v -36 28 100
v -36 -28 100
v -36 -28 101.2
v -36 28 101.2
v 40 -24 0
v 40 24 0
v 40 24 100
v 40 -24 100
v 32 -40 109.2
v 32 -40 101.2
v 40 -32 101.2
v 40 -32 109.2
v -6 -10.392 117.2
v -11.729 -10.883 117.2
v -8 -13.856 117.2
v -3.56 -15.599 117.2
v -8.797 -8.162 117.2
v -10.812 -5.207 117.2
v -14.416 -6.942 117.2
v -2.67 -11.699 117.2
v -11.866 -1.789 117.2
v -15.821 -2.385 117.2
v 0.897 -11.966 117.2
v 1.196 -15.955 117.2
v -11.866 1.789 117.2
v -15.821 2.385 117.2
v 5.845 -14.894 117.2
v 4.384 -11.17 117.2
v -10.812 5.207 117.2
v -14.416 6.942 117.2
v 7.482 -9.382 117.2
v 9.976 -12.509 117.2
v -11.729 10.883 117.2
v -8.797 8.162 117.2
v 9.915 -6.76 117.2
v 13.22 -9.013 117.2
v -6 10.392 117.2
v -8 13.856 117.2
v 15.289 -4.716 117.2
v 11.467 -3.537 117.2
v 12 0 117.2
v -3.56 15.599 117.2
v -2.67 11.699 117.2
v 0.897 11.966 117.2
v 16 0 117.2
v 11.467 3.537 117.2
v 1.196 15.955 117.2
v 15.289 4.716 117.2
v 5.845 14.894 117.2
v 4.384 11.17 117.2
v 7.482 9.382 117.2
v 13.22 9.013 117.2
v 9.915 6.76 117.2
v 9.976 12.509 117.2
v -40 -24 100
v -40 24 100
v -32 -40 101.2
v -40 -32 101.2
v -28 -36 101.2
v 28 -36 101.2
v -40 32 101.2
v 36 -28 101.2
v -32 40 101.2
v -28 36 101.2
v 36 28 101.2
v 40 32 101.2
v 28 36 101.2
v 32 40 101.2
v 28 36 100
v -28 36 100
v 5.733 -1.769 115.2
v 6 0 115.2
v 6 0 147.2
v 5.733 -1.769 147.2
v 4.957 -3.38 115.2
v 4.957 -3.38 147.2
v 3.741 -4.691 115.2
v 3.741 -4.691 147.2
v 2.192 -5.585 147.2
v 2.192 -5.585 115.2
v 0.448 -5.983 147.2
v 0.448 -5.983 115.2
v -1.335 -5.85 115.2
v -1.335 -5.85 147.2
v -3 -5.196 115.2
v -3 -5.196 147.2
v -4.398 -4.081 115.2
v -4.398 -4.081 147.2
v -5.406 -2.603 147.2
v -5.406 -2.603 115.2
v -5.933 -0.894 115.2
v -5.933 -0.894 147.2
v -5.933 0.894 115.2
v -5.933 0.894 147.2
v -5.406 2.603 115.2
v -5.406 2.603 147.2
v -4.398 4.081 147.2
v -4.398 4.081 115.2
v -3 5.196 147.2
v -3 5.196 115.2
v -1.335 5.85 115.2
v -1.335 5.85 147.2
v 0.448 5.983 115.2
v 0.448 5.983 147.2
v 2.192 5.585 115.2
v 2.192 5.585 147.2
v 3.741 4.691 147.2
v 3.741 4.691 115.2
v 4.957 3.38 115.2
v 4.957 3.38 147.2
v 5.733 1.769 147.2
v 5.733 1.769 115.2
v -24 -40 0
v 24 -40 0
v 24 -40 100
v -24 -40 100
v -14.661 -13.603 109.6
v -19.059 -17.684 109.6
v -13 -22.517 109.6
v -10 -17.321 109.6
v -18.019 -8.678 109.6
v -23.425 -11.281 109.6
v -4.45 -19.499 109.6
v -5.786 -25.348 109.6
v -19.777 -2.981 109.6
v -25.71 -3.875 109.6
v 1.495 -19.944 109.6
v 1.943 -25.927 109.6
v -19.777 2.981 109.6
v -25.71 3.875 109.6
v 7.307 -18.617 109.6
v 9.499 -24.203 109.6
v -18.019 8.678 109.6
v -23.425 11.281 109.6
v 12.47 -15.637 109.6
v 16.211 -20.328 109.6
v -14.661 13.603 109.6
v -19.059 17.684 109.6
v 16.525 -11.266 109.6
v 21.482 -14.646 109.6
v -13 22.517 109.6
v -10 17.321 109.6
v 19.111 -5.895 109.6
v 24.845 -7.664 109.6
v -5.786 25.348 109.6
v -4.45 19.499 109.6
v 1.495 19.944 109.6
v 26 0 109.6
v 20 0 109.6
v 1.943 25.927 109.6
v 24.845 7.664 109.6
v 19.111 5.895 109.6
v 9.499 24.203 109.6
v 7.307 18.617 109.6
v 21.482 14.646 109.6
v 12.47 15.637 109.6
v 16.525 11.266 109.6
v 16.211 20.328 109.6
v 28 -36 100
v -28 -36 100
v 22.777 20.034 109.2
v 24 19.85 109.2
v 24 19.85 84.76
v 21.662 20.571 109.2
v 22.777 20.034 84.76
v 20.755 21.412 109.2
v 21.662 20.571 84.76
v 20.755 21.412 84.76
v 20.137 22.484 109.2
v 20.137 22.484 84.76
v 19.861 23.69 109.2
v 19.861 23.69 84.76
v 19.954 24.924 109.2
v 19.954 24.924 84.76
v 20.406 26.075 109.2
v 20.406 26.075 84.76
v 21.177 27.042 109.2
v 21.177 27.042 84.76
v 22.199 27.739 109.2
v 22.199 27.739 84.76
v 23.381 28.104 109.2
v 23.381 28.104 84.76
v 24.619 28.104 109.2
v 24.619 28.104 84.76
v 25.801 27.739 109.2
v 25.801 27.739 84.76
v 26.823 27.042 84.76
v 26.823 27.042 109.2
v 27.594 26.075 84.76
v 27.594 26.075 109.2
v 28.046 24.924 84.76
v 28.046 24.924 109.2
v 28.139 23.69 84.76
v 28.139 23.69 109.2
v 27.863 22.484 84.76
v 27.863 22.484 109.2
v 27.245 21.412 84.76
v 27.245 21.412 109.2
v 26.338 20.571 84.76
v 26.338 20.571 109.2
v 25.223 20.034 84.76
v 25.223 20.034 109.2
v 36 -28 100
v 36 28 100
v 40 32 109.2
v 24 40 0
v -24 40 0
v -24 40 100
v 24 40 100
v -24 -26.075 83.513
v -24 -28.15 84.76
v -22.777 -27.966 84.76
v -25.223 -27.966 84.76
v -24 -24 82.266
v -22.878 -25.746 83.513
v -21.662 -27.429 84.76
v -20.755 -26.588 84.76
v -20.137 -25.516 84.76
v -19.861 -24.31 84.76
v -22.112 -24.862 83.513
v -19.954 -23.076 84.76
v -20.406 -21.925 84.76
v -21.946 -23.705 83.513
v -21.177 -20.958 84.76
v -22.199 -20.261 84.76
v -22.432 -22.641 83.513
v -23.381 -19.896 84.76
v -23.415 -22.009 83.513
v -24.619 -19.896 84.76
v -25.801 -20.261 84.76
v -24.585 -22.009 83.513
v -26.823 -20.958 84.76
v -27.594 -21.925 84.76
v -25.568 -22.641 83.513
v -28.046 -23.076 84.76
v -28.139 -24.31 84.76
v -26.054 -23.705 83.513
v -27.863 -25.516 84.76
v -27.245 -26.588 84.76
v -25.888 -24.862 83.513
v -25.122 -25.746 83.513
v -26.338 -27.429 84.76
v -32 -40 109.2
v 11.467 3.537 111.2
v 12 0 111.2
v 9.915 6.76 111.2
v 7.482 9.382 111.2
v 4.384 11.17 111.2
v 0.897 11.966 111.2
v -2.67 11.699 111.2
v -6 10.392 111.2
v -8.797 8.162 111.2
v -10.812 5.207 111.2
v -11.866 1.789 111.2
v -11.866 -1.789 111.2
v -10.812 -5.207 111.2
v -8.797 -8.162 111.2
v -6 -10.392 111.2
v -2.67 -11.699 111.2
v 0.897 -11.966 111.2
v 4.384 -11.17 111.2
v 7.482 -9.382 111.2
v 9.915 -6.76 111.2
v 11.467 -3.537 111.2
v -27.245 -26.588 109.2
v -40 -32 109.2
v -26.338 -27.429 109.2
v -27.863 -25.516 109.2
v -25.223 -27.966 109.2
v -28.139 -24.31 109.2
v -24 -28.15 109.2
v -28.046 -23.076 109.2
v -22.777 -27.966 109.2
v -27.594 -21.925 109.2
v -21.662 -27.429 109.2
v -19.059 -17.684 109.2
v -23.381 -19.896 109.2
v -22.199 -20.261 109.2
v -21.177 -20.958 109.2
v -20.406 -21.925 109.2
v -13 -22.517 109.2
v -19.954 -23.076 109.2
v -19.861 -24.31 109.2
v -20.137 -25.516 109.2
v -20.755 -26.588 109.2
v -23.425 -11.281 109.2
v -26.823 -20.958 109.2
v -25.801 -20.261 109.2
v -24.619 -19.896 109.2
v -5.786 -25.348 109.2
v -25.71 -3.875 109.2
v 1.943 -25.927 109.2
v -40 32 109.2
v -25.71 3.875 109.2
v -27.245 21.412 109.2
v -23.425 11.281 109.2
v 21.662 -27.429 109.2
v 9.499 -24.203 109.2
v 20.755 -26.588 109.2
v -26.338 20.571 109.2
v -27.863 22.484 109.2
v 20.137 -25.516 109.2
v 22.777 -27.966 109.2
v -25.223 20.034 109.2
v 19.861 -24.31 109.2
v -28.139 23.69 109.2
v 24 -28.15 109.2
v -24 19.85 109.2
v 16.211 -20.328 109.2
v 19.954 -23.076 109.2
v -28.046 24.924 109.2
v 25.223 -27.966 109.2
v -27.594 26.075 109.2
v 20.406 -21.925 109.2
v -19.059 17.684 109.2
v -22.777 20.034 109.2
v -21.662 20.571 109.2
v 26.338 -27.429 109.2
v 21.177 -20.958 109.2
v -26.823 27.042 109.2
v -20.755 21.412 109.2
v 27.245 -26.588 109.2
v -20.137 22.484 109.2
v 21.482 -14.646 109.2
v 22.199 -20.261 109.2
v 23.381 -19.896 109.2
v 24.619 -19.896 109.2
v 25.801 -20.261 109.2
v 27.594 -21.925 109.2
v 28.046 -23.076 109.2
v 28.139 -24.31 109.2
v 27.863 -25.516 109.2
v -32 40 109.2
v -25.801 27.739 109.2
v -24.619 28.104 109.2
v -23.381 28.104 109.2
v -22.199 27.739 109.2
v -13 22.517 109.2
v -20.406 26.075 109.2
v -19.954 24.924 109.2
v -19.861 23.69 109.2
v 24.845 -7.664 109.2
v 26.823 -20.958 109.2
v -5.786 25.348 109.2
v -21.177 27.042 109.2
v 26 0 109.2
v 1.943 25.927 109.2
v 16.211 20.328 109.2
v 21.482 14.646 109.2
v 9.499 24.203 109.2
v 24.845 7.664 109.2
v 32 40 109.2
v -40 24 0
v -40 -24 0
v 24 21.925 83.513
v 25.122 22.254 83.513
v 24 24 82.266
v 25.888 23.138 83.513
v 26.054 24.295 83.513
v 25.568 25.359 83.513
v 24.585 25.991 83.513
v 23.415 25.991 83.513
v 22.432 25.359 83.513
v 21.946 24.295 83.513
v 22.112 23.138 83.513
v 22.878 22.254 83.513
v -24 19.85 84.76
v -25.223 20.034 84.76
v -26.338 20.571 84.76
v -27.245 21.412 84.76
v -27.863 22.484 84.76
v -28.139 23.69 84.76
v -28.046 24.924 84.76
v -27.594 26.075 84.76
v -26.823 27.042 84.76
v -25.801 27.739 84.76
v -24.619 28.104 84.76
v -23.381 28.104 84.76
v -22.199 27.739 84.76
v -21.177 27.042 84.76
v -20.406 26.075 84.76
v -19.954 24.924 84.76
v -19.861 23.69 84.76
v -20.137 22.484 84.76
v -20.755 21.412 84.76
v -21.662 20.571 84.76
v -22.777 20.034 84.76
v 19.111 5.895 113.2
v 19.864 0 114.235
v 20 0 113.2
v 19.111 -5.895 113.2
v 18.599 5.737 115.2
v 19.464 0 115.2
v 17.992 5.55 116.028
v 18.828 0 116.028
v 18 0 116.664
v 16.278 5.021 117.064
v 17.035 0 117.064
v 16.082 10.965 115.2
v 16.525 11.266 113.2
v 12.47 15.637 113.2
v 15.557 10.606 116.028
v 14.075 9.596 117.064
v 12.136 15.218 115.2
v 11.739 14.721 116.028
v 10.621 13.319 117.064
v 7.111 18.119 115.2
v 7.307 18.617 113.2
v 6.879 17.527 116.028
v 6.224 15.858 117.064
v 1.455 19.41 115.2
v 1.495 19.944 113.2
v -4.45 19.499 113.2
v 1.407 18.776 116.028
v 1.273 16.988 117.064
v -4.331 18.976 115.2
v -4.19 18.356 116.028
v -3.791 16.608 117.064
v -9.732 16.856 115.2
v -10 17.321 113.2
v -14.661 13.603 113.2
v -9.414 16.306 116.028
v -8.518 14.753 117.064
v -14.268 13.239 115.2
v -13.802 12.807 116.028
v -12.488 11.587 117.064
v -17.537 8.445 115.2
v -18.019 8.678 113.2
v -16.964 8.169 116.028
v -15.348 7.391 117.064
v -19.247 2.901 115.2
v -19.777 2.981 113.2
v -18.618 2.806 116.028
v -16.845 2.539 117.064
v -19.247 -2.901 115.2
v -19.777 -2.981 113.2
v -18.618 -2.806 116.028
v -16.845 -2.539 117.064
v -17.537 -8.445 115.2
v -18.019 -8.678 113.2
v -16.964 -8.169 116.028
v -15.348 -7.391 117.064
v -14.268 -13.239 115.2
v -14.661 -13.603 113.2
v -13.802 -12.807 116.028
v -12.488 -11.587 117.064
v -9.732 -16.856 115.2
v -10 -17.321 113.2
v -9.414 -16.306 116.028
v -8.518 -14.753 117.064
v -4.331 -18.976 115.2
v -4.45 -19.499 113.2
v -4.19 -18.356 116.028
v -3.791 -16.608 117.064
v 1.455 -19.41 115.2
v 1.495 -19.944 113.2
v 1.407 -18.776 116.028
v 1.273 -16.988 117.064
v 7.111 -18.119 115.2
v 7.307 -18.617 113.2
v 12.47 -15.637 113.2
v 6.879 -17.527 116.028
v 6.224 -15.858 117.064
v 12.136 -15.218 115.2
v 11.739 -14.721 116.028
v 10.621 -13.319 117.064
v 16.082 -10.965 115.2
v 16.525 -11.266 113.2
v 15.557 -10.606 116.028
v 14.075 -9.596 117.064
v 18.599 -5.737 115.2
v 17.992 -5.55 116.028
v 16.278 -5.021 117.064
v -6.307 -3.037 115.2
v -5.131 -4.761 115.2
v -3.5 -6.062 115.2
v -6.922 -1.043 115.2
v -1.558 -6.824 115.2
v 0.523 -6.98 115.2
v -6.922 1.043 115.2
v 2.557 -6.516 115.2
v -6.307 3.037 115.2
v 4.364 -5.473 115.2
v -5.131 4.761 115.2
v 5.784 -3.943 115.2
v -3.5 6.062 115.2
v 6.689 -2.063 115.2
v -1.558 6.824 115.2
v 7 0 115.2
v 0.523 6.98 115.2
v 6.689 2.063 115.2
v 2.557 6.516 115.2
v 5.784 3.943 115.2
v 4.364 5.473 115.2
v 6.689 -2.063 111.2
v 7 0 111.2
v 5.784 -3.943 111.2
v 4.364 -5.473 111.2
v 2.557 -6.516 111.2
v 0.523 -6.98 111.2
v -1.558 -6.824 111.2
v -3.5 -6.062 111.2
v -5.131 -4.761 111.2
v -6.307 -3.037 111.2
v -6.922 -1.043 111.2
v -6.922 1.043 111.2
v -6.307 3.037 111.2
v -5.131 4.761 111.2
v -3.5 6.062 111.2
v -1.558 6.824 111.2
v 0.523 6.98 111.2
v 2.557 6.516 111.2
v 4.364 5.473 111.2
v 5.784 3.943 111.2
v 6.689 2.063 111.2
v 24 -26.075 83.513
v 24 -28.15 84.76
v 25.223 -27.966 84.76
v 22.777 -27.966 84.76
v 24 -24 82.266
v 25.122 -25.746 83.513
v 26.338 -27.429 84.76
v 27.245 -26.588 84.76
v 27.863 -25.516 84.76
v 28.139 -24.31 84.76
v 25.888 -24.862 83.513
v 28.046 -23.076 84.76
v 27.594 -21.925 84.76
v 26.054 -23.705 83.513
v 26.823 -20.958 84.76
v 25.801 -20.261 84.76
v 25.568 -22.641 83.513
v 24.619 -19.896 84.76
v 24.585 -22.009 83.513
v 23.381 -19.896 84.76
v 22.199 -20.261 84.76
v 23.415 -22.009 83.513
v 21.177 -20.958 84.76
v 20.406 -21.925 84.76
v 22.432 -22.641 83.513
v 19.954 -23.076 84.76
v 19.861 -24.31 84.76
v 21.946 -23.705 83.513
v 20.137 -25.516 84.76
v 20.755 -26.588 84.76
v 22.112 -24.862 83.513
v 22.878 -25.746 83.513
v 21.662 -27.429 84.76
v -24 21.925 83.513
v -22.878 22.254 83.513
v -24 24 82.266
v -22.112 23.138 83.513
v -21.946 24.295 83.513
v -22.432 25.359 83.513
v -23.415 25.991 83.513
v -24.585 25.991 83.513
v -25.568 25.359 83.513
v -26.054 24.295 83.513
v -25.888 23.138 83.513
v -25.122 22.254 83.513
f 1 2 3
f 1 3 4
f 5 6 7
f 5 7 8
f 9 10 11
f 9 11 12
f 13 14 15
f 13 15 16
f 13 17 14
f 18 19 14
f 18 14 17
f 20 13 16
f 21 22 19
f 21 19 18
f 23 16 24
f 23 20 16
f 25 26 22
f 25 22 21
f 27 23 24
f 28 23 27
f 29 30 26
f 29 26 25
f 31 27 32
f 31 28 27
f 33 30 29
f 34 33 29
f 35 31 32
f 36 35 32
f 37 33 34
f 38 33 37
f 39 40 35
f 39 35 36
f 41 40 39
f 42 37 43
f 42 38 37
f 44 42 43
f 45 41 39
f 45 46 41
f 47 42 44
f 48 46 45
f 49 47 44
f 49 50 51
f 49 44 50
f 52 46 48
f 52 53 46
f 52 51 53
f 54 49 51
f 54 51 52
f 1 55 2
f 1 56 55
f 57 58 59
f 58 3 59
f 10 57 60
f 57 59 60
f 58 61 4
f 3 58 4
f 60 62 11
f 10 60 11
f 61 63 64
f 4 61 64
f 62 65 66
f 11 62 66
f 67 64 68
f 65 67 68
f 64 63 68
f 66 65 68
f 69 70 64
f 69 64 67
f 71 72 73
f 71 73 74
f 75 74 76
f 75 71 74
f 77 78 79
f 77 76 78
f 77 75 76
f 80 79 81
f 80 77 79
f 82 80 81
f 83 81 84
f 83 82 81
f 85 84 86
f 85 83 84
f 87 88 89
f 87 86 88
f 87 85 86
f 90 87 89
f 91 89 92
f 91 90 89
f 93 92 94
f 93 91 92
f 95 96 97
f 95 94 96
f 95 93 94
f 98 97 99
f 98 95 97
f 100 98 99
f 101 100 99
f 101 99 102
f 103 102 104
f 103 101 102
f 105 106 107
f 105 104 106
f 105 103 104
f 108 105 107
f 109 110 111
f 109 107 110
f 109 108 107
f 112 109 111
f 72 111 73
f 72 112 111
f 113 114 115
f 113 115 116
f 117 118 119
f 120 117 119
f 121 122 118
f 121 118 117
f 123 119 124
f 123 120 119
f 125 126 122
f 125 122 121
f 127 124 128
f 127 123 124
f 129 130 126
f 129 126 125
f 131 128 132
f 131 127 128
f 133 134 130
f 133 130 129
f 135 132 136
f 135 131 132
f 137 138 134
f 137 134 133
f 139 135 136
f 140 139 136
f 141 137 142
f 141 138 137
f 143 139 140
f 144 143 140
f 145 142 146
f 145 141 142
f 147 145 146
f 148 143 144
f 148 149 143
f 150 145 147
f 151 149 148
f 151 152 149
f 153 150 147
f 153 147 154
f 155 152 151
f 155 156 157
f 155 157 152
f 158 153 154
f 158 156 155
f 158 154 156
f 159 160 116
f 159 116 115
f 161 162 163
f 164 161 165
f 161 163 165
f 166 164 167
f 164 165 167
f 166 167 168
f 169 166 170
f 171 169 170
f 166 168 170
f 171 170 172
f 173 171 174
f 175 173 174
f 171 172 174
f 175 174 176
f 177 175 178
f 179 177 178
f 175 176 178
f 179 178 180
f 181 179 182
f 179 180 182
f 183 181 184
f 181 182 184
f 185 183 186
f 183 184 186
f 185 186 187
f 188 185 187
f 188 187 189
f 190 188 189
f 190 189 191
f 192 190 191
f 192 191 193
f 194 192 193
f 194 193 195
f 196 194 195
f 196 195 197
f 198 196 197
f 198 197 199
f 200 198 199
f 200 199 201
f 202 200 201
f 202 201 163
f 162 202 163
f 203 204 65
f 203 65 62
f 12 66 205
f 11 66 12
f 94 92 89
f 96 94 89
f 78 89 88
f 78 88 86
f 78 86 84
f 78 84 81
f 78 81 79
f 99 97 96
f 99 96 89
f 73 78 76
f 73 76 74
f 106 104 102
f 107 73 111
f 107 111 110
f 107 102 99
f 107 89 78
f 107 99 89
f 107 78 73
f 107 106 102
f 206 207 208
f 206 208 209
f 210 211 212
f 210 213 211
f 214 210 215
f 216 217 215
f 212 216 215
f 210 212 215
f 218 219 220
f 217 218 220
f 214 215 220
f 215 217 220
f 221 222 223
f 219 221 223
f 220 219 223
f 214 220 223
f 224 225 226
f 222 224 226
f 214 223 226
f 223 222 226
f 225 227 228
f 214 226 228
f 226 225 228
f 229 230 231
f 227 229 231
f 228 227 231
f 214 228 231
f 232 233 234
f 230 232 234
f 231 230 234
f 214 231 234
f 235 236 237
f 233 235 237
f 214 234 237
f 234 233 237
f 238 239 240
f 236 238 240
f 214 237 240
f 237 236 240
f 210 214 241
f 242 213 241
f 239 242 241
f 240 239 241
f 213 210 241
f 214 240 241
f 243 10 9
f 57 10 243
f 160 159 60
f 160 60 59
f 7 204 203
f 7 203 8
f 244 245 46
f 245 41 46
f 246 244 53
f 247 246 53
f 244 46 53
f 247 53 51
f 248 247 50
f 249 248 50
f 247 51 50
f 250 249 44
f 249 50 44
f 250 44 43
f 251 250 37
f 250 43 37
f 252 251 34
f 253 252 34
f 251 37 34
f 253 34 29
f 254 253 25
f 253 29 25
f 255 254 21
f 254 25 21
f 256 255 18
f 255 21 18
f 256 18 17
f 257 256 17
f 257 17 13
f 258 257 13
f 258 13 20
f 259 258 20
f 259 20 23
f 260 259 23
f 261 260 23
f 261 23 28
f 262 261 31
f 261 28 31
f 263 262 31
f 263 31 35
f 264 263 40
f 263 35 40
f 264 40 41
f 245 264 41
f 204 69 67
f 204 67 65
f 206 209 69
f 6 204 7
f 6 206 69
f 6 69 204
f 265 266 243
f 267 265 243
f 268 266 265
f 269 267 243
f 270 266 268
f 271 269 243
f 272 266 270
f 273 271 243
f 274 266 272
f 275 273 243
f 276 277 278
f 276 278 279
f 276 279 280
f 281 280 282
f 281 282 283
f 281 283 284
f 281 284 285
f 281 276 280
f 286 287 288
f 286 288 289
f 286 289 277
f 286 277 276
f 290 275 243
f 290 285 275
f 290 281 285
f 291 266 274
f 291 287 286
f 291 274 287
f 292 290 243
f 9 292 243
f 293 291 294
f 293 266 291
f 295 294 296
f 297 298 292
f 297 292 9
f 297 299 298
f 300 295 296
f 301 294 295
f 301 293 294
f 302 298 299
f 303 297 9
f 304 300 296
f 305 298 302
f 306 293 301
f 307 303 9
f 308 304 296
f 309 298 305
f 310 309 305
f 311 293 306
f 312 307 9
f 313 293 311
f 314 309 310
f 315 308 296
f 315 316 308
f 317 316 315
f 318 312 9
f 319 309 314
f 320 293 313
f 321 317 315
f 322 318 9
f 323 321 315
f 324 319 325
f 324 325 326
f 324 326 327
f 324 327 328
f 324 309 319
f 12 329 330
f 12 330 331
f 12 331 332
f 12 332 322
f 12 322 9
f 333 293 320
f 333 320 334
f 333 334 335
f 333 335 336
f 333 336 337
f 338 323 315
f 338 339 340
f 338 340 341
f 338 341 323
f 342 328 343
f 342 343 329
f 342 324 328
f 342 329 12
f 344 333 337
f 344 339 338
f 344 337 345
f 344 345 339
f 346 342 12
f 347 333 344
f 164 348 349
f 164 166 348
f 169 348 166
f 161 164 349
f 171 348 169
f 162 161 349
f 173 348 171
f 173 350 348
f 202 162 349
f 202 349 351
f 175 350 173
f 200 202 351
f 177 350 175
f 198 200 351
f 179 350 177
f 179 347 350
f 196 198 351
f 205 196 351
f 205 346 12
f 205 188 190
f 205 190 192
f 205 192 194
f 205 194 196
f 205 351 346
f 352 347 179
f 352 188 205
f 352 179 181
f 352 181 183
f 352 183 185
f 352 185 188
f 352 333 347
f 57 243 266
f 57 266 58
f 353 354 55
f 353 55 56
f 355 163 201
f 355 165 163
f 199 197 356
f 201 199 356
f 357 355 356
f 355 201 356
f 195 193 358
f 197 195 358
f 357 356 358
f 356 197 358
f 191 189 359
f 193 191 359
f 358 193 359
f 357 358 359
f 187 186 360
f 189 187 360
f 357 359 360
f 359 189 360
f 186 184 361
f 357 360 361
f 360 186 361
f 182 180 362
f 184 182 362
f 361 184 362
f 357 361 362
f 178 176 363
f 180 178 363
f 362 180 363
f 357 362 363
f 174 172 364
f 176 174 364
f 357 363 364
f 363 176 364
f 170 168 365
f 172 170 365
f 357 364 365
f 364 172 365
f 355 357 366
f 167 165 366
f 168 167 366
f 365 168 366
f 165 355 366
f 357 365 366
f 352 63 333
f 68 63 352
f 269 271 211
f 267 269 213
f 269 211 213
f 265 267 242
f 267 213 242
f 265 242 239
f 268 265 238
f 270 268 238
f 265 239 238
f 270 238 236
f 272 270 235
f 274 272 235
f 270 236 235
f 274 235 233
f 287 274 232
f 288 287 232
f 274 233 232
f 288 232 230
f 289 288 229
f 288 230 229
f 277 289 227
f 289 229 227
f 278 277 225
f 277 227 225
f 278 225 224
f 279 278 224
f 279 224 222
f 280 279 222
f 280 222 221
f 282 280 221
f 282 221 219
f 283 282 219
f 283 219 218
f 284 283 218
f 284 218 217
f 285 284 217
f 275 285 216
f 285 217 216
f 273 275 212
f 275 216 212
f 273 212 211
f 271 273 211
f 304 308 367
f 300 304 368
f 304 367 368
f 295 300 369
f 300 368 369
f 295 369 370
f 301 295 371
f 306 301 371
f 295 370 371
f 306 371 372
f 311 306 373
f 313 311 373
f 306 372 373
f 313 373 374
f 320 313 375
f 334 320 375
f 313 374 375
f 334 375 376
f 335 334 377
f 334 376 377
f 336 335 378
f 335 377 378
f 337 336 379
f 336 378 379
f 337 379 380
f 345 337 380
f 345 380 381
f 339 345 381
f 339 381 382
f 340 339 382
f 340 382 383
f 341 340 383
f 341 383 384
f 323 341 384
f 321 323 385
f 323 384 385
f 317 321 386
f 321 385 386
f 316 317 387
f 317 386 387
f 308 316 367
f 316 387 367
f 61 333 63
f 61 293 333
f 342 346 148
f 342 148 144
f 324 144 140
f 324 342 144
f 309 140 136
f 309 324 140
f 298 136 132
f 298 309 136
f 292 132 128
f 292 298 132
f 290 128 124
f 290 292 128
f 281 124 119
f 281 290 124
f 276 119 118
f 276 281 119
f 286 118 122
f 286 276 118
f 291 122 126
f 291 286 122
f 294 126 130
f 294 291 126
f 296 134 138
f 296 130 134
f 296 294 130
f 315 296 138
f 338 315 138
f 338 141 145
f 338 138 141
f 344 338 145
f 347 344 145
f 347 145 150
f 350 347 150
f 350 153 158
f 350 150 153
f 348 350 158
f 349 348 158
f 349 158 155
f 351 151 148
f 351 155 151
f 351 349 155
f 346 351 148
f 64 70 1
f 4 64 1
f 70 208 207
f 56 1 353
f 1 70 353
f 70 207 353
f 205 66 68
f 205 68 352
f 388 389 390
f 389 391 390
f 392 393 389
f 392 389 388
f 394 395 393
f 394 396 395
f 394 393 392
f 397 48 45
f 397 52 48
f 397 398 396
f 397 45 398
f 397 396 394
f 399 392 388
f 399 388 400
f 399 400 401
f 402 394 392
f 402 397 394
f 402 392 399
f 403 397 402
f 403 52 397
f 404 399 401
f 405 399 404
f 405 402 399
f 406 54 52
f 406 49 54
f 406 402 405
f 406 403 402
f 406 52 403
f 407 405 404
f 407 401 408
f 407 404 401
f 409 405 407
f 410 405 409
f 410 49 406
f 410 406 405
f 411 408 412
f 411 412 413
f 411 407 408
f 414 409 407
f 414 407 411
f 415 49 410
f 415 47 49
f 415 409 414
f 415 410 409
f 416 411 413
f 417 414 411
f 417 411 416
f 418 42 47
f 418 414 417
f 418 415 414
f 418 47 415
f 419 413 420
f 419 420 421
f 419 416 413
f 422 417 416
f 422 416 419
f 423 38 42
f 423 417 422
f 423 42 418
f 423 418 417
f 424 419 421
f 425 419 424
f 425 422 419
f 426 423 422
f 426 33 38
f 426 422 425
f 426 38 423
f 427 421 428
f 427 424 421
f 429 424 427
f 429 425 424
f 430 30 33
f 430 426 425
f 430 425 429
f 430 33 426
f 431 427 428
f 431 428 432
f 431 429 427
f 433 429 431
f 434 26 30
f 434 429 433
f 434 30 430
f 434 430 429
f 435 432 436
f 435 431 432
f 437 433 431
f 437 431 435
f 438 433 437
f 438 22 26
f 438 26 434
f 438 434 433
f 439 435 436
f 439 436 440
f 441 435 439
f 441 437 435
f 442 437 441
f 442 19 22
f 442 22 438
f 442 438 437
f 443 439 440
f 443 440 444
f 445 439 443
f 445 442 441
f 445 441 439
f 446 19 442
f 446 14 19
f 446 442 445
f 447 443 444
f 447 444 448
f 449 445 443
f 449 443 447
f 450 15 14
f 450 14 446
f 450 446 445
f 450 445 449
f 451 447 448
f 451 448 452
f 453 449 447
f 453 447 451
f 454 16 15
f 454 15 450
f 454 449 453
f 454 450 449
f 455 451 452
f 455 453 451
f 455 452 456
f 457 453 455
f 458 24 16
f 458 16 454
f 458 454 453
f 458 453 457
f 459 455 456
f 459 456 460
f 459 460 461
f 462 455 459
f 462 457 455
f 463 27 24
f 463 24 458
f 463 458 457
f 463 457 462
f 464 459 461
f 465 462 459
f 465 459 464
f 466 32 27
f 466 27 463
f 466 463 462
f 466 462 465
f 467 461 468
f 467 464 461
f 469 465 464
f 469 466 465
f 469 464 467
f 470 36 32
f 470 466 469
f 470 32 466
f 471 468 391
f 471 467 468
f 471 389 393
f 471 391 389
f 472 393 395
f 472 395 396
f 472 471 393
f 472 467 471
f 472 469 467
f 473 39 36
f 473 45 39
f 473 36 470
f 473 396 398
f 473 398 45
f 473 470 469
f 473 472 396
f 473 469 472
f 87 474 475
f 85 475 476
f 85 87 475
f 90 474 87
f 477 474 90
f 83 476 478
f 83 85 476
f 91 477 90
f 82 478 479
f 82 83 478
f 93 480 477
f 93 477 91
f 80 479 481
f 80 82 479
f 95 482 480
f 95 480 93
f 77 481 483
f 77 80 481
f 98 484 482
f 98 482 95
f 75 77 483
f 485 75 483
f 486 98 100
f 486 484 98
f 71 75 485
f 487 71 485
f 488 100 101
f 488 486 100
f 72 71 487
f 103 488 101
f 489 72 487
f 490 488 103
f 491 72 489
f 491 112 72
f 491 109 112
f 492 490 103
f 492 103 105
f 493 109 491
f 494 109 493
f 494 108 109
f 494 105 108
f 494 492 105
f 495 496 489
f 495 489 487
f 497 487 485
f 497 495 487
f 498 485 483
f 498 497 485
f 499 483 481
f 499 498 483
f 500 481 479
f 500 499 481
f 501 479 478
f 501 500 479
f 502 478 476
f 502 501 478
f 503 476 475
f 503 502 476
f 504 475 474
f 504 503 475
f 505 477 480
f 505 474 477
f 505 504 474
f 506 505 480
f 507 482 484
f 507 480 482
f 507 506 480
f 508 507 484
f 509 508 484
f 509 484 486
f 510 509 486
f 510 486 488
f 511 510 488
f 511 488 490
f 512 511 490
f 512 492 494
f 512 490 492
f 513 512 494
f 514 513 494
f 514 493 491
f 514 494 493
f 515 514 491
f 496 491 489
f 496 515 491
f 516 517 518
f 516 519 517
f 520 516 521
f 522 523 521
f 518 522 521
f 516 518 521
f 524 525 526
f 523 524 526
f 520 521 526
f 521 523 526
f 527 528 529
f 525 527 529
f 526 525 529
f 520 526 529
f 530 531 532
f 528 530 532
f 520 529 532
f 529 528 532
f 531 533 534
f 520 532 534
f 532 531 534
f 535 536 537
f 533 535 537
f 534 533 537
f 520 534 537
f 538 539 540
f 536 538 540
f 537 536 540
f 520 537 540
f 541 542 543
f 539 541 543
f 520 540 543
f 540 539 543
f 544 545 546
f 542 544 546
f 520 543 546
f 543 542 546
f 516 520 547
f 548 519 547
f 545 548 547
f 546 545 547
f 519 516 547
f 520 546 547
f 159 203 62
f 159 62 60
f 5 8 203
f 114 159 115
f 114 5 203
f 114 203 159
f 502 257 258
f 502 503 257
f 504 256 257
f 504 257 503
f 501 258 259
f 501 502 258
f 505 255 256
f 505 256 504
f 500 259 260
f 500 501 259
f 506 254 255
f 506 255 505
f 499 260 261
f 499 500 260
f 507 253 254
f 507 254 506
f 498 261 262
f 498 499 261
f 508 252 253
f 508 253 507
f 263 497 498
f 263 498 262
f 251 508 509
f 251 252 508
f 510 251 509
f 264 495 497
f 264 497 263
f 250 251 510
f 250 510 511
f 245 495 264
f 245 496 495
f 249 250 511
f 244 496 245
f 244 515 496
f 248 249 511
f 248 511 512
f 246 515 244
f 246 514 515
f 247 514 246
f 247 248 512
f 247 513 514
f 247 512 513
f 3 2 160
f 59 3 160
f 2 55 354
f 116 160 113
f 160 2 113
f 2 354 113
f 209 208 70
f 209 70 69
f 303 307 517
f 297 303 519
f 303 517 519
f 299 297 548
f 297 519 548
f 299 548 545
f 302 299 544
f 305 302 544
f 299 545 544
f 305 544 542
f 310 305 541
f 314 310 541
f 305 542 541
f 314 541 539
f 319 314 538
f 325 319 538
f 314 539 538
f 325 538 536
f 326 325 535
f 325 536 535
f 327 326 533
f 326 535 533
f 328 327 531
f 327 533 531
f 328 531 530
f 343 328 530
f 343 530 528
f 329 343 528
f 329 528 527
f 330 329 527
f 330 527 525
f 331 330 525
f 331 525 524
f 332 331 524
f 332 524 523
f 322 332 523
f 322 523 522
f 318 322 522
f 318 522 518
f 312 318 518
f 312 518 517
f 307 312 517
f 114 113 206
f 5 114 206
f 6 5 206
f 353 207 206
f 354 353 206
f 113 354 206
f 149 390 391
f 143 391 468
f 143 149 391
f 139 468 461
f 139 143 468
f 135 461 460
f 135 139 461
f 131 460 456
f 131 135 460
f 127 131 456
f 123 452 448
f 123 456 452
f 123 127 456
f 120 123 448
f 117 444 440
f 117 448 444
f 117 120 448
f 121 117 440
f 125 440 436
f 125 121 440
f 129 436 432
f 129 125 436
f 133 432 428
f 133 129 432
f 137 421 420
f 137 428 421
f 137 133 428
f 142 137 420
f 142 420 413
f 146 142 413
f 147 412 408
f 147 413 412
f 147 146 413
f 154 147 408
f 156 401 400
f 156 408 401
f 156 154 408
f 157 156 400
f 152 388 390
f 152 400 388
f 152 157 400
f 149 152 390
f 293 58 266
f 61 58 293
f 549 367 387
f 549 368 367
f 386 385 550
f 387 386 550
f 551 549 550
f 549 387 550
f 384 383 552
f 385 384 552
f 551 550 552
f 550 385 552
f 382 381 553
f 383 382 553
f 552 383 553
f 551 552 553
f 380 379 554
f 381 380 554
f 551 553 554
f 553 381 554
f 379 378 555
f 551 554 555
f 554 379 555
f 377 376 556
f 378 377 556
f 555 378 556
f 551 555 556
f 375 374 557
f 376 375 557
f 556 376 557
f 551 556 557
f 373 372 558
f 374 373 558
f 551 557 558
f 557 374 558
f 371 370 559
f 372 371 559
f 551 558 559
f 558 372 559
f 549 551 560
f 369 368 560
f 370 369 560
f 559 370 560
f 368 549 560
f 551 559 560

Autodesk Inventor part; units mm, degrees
ref_plane "YZ Plane" through (0, 0, 0) normal (1, 0, 0) x (0, 1, 0)
ref_plane "XZ Plane" through (0, 0, 0) normal (0, 1, 0) x (-1, 0, 0)
ref_plane "XY Plane" through (0, 0, 0) normal (0, 0, 1) x (1, 0, 0)
sketch "草图1" plane through (0, 0, 0) normal (0, 0, 1) x (1, 0, 0)
  line L0 (-100, 100) -> (100, 100)
  line L1 (100, 100) -> (100, -100)
  line L2 (100, -100) -> (-100, -100)
  line L3 (-100, -100) -> (-100, 100)
  line L4 (-100, 100) -> (100, -100) construction
  line L5 (100, 100) -> (-100, -100) construction
  point P0 (0, 0)
  dimension "d0" = 200
  dimension "d1" = 200
extrude "拉伸1" add sketch "草图1" along normal blind 250
sketch "草图3" plane through (0, 0, 250) normal (0, 0, 1) x (1, 0, 0)
  line L0 (-90, 90) -> (90, 90)
  line L1 (90, 90) -> (90, -90)
  line L2 (90, -90) -> (-90, -90)
  line L3 (-90, -90) -> (-90, 90)
  line L4 (-90, 90) -> (90, -90) construction
  line L5 (90, 90) -> (-90, -90) construction
  point P0 (0, 0)
  dimension "d6" = 180
  dimension "d7" = 180
extrude "拉伸2" add sketch "草图3" along normal blind 3
chamfer "倒角1" distance 40 angle 45 4 edges at (100, 100, 125) (-100, -100, 125) (100, -100, 125) (-100, 100, 125)
sketch "草图4" plane through (0, 0, 253) normal (0, 0, 1) x (1, 0, 0)
  line L0 (-100, 100) -> (100, 100)
  line L1 (100, 100) -> (100, -100)
  line L2 (100, -100) -> (-100, -100)
  line L3 (-100, -100) -> (-100, 100)
  line L4 (-100, 100) -> (100, -100) construction
  line L5 (100, 100) -> (-100, -100) construction
  point P0 (0, 0)
  dimension "d10" = 200
  dimension "d11" = 200
extrude "拉伸3" add sketch "草图4" along normal blind 20
sketch "草图5" plane through (0, 0, 273) normal (0, 0, 1) x (1, 0, 0)
  circle A0 centre (0, 0) radius 50
  dimension "d17" = 100
extrude "拉伸4" add sketch "草图5" along normal blind 20
fillet "圆角1" radius 10 1 edges at (-50, 0, 293)
sketch "草图6" plane through (0, 0, 273) normal (0, 0, 1) x (1, 0, 0)
  circle A0 centre (0, 0) radius 65
  dimension "d21" = 130
extrude "拉伸5" add sketch "草图6" along normal blind 1
sketch "草图7" plane through (0, 0, 293) normal (0, 0, 1) x (1, 0, 0)
  circle A0 centre (0, 0) radius 30
  dimension "d24" = 60
extrude "拉伸6" cut sketch "草图7" against normal blind 15
sketch "草图8" plane through (0, 0, 278) normal (0, 0, 1) x (1, 0, 0)
  circle A0 centre (0, 0) radius 17.5
  dimension "d27" = 35
extrude "拉伸7" add sketch "草图8" along normal blind 10
sketch "草图9" plane through (0, 0, 288) normal (0, 0, 1) x (1, 0, 0)
  circle A0 centre (0, 0) radius 15
  dimension "d30" = 30
extrude "拉伸8" add sketch "草图9" along normal blind 80
sketch "草图10" plane through (0, 0, 273) normal (0, 0, 1) x (1, 0, 0)
  point P0 (0, 0)
  point P1 (-60, 60)
  point P2 (60, 60)
  point P3 (60, -60)
  point P4 (-60, -60)
  dimension "d33" = 60
  dimension "d34" = 60
  dimension "d37" = 360
hole "孔1" at (-60, 60, 273) at (60, 60, 273) at (60, -60, 273) at (-60, -60, 273) direction (0, 0, -1) diameter 20.752 depth 61.1 tip angle 118 thread size "M24x3" designation "M24" class "6H" standard "GB Metric profile"
chamfer "倒角2" distance 20 angle 45 4 edges at (-100, -100, 263) (100, -100, 263) (100, 100, 263) (-100, 100, 263)
scale "缩放比例1" factors (0.4, 0.4, 0.4) then translate (0, 0, 0) bodies 1
properties part number "电机"
